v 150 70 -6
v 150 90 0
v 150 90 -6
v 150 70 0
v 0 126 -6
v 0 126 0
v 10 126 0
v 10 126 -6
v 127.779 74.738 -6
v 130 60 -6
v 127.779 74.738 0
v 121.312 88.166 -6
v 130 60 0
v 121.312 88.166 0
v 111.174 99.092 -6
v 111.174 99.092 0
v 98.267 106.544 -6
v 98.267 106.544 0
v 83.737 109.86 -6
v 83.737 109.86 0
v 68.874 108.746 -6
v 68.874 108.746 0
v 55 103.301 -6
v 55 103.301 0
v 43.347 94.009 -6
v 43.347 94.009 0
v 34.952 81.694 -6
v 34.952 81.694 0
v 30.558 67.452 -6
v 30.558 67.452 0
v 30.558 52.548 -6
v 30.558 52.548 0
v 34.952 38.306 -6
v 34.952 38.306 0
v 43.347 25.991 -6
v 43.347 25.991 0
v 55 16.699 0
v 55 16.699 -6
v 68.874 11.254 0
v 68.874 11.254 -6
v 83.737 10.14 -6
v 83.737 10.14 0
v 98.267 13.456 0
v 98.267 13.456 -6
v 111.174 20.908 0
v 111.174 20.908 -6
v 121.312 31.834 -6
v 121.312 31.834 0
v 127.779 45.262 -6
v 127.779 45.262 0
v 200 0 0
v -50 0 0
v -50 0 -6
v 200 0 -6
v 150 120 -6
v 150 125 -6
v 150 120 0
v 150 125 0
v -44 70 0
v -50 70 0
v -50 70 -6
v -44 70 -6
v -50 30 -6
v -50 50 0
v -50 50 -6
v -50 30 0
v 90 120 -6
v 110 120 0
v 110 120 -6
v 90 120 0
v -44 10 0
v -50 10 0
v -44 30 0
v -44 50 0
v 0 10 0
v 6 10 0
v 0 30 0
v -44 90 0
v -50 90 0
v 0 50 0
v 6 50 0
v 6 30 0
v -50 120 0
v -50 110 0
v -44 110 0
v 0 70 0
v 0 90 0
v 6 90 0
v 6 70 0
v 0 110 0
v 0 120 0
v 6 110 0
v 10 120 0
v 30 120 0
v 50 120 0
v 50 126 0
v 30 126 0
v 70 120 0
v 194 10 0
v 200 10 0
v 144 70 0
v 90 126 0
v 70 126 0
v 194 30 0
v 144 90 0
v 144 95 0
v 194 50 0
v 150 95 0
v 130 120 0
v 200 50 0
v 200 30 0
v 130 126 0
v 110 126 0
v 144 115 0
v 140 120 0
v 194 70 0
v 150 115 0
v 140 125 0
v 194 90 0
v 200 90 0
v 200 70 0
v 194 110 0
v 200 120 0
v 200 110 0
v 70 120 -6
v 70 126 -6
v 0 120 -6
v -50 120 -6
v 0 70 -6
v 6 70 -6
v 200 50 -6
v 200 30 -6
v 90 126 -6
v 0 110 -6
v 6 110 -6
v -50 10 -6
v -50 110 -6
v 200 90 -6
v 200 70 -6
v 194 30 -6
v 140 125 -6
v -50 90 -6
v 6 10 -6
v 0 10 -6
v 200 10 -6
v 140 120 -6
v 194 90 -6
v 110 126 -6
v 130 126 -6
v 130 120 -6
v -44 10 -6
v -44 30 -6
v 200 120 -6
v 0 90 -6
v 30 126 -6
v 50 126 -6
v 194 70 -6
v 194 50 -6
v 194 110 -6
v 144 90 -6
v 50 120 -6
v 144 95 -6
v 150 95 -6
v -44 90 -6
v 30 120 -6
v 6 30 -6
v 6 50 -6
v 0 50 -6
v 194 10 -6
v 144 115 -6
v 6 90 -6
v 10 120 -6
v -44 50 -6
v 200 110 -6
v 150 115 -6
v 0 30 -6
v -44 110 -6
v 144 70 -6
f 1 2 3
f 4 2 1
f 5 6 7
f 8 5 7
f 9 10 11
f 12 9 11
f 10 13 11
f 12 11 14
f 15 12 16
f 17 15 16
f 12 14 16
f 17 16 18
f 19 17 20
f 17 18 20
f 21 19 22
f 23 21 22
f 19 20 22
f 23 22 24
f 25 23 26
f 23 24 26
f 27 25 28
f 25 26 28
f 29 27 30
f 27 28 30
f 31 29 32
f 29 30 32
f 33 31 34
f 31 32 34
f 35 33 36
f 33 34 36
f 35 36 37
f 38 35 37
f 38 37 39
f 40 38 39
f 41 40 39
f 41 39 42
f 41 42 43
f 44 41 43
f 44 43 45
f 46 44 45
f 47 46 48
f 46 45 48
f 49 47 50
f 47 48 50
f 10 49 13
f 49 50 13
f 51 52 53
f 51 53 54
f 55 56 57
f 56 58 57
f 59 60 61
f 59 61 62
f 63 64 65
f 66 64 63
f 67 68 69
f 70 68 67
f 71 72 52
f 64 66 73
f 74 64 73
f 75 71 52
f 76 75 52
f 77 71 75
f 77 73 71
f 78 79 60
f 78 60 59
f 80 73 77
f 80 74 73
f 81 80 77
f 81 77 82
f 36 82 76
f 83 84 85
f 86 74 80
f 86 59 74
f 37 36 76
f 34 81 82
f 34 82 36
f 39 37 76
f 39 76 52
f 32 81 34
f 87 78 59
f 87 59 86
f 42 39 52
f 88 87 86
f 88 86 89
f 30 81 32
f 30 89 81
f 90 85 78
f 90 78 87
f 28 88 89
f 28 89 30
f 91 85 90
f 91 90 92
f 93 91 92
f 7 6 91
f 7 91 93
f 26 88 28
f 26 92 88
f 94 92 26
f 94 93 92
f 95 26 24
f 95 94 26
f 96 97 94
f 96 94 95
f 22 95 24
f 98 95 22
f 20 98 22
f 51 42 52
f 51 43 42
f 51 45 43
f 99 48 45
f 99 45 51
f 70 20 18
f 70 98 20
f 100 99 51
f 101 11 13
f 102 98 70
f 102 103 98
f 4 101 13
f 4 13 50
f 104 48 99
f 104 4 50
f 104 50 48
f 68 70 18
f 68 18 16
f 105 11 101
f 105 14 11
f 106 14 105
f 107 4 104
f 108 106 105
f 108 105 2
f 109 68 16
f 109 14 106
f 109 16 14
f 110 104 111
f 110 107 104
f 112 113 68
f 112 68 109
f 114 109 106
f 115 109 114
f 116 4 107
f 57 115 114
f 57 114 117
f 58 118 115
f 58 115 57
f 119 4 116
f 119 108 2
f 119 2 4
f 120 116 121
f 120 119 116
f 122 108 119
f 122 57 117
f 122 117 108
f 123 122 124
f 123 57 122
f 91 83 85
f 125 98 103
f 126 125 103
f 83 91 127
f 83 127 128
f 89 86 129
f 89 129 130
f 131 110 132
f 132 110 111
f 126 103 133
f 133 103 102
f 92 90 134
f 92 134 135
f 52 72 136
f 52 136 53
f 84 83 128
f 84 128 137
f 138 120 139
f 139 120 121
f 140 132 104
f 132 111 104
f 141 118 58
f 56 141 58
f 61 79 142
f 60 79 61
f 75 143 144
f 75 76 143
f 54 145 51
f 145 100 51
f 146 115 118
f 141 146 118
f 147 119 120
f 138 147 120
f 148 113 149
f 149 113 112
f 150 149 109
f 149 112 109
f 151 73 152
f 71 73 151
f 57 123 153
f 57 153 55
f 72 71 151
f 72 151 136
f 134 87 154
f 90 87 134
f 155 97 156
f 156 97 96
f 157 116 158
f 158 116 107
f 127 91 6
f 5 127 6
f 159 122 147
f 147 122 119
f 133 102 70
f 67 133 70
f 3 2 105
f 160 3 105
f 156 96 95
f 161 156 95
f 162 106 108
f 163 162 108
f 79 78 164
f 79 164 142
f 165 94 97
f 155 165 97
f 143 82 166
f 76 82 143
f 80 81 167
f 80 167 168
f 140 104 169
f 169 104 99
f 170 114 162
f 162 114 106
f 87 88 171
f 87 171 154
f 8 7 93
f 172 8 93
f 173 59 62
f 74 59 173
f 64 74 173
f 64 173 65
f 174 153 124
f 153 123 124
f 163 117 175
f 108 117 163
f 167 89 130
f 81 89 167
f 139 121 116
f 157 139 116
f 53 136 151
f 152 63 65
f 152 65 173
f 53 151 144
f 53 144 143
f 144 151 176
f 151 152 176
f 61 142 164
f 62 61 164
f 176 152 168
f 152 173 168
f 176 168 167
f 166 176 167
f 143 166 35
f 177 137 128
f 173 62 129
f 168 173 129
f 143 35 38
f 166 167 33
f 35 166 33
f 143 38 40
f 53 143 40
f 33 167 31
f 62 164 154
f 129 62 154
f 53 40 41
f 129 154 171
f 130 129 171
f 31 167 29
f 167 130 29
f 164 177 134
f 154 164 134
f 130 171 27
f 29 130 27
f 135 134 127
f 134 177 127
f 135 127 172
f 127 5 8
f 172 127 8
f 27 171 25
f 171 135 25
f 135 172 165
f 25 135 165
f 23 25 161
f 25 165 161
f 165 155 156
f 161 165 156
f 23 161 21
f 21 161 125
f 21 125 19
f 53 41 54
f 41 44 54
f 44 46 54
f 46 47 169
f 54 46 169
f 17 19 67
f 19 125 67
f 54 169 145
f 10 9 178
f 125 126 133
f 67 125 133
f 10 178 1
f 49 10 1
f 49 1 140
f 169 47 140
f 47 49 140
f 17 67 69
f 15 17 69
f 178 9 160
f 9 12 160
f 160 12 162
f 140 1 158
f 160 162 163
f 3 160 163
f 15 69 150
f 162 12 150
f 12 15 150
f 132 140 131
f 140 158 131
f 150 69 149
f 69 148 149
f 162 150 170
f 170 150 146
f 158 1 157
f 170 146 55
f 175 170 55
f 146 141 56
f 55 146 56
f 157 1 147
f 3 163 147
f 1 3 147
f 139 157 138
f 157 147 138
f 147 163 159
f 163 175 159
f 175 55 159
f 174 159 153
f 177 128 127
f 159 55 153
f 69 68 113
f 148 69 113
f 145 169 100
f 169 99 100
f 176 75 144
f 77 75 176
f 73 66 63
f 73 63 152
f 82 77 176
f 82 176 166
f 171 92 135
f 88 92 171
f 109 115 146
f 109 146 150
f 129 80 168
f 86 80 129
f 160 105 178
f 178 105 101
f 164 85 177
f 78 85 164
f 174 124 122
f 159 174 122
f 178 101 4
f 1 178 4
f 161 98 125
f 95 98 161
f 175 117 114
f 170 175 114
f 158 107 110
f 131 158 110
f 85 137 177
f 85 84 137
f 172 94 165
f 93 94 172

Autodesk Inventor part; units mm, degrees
ref_plane "YZ Plane" through (0, 0, 0) normal (1, 0, 0) x (0, 1, 0)
ref_plane "XZ Plane" through (0, 0, 0) normal (0, 1, 0) x (-1, 0, 0)
ref_plane "XY Plane" through (0, 0, 0) normal (0, 0, 1) x (1, 0, 0)
sketch "Sketch1" plane through (0, 0, 0) normal (0, 0, 1) x (1, 0, 0)
  line L0 (0, 0) -> (0, 120)
  circle A0 centre (80, 60) radius 50
  line L1 (0, 0) -> (150, 0)
  line L2 (150, 120) -> (0, 120)
  line L3 (0, 120) -> (0, 110)
  line L4 (0, 110) -> (6, 110)
  line L5 (6, 110) -> (6, 90)
  line L6 (6, 90) -> (0, 90)
  line L7 (0, 90) -> (0, 70)
  line L8 (0, 70) -> (6, 70)
  line L9 (6, 70) -> (6, 50)
  line L10 (6, 50) -> (0, 50)
  line L11 (0, 50) -> (0, 30)
  line L12 (0, 30) -> (6, 30)
  line L13 (6, 30) -> (6, 10)
  line L14 (6, 10) -> (0, 10)
  line L15 (0, 120) -> (-50, 120)
  line L16 (-50, 120) -> (-50, 110)
  line L17 (-50, 110) -> (-44, 110)
  line L18 (-44, 110) -> (-44, 90)
  line L19 (-44, 90) -> (-50, 90)
  line L20 (-50, 90) -> (-50, 70)
  line L21 (-50, 70) -> (-44, 70)
  line L22 (-44, 70) -> (-44, 50)
  line L23 (-44, 50) -> (-50, 50)
  line L24 (-50, 50) -> (-50, 30)
  line L25 (-50, 30) -> (-44, 30)
  line L26 (-44, 30) -> (-44, 10)
  line L27 (-44, 10) -> (-50, 10)
  line L28 (-50, 10) -> (-50, 0)
  line L29 (-50, 0) -> (0, 0)
  line L30 (150, 115) -> (144, 115)
  line L31 (144, 115) -> (144, 95)
  line L32 (150, 120) -> (200, 120)
  line L33 (200, 120) -> (200, 110)
  line L34 (200, 110) -> (194, 110)
  line L35 (194, 110) -> (194, 90)
  line L36 (194, 90) -> (200, 90)
  line L37 (200, 90) -> (200, 70)
  line L38 (200, 70) -> (194, 70)
  line L39 (194, 70) -> (194, 50)
  line L40 (194, 50) -> (200, 50)
  line L41 (200, 50) -> (200, 30)
  line L42 (200, 30) -> (194, 30)
  line L43 (194, 30) -> (194, 10)
  line L44 (194, 10) -> (200, 10)
  line L45 (200, 10) -> (200, 0)
  line L46 (200, 0) -> (150, 0)
  line L47 (150, 120) -> (150, 0)
  line L48 (144, 95) -> (150, 95)
  line L49 (150, 95) -> (150, 90)
  line L50 (150, 90) -> (144, 90)
  line L51 (144, 90) -> (144, 70)
  line L52 (144, 70) -> (150, 70)
  line L53 (0, 120) -> (0, 126)
  line L54 (150, 125) -> (150, 120)
  line L55 (0, 126) -> (10, 126)
  line L56 (10, 126) -> (10, 120)
  line L57 (10, 120) -> (30, 120)
  line L58 (30, 120) -> (30, 126)
  line L59 (30, 126) -> (50, 126)
  line L60 (50, 126) -> (50, 120)
  line L61 (50, 120) -> (70, 120)
  line L62 (70, 120) -> (70, 126)
  line L63 (70, 126) -> (90, 126)
  line L64 (90, 126) -> (90, 120)
  line L65 (90, 120) -> (110, 120)
  line L66 (110, 120) -> (110, 126)
  line L67 (110, 126) -> (130, 126)
  line L68 (130, 126) -> (130, 120)
  line L69 (130, 120) -> (140, 120)
  line L70 (140, 120) -> (140, 125)
  line L71 (140, 125) -> (150, 125)
  dimension "d12" = 100
  dimension "d13" = 120
  dimension "d14" = 150
  dimension "d17" = 80
  dimension "d18" = 60
  dimension "d19" = 10
  dimension "d20" = 6
  dimension "d21" = 20
  dimension "d22" = 20
  dimension "d24" = 20
  dimension "d25" = 20
  dimension "d26" = 20
  dimension "d38" = 50
  dimension "d39" = 10
  dimension "d40" = 6
  dimension "d41" = 5
  dimension "d42" = 6
  dimension "d43" = 50
  dimension "d44" = 6
  dimension "d45" = 5
  dimension "d46" = 20
  dimension "d47" = 20
  dimension "d48" = 6
  dimension "d51" = 10
  dimension "d52" = 20
  dimension "d53" = 20
  dimension "d54" = 20
  dimension "d55" = 20
  dimension "d56" = 20
  dimension "d57" = 20
  dimension "d58" = 10
extrude "Extrusion1" add sketch "Sketch1" against normal blind 6 contours L29 L28 L27 L26 L25 L24 L23 L22 L21 L20 L19 L18 L17 L16 L15 L0 | L0 L14 L13 L12 L10 L9 L8 L6 L5 L4 L2 L47 L30 L31 L48 L50 L51 L52 L1 | L47 L32 L33 L34 L35 L36 L37 L38 L39 L40 L41 L42 L43 L44 L45 L46
extrude "Extrusion3" add sketch "Sketch1" against normal blind 6 contours L2 L70 L71 L54 | L53 L55 L56 L2 | L2 L66 L67 L68 | L58 L59 L60 L2 | L2 L62 L63 L64
sketch "Sketch3" plane through (0, 0, 0) normal (0, 0, 1) x (1, 0, 0)
  line L0 (200, 30) -> (200, 50) projected
  line L1 (194, 30) -> (200, 30) projected
  line L2 (200, 50) -> (200, 30) projected
  line L3 (200, 30) -> (194, 30) projected
  line L4 (194, 10) -> (194, 30) projected
  line L5 (194, 30) -> (194, 10) projected
  line L6 (200, 10) -> (194, 10) projected
  line L7 (194, 10) -> (200, 10) projected
  line L8 (200, 0) -> (200, 10) projected
  circle A0 centre (80, 60) radius 50 projected
  circle A1 centre (80, 60) radius 50 projected
  circle A2 centre (80, 60) radius 50 projected
  circle A3 centre (80, 60) radius 50 projected
  line L9 (0, 30) -> (6, 30) projected
  line L10 (6, 30) -> (6, 10) projected
  line L11 (6, 10) -> (0, 10) projected
  line L12 (0, 10) -> (0, 30) projected
  circle A4 centre (80, 60) radius 50 projected
  line L13 (150, 90) -> (150, 70) projected
  line L14 (150, 70) -> (144, 70) projected
  line L15 (144, 70) -> (144, 90) projected
  line L16 (144, 90) -> (150, 90) projected
  line L17 (150, 115) -> (150, 95) projected
  line L18 (150, 95) -> (144, 95) projected
  line L19 (144, 95) -> (144, 115) projected
  line L20 (144, 115) -> (150, 115) projected
  line L21 (0, 70) -> (6, 70) projected
  line L22 (6, 70) -> (6, 50) projected
  line L23 (6, 50) -> (0, 50) projected
  line L24 (0, 50) -> (0, 70) projected
  line L25 (0, 110) -> (6, 110) projected
  line L26 (6, 110) -> (6, 90) projected
  line L27 (6, 90) -> (0, 90) projected
  line L28 (0, 90) -> (0, 110) projected
  line L29 (200, 120) -> (150, 120) projected
  line L30 (150, 120) -> (150, 125) projected
  line L31 (150, 125) -> (140, 125) projected
  line L32 (140, 125) -> (140, 120) projected
  line L33 (140, 120) -> (130, 120) projected
  line L34 (130, 120) -> (130, 126) projected
  line L35 (130, 126) -> (110, 126) projected
  line L36 (110, 126) -> (110, 120) projected
  line L37 (110, 120) -> (90, 120) projected
  line L38 (90, 120) -> (90, 126) projected
  line L39 (90, 126) -> (70, 126) projected
  line L40 (70, 126) -> (70, 120) projected
  line L41 (70, 120) -> (50, 120) projected
  line L42 (50, 120) -> (50, 126) projected
  line L43 (50, 126) -> (30, 126) projected
  line L44 (30, 126) -> (30, 120) projected
  line L45 (30, 120) -> (10, 120) projected
  line L46 (10, 120) -> (10, 126) projected
  line L47 (10, 126) -> (0, 126) projected
  line L48 (0, 126) -> (0, 120) projected
  line L49 (0, 120) -> (-50, 120) projected
  line L50 (-50, 120) -> (-50, 110) projected
  line L51 (-50, 110) -> (-44, 110) projected
  line L52 (-44, 110) -> (-44, 90) projected
  line L53 (-44, 90) -> (-50, 90) projected
  line L54 (-50, 90) -> (-50, 70) projected
  line L55 (-50, 70) -> (-44, 70) projected
  line L56 (-44, 70) -> (-44, 50) projected
  line L57 (-44, 50) -> (-50, 50) projected
  line L58 (-50, 50) -> (-50, 30) projected
  line L59 (-50, 30) -> (-44, 30) projected
  line L60 (-44, 30) -> (-44, 10) projected
  line L61 (-44, 10) -> (-50, 10) projected
  line L62 (-50, 10) -> (-50, 0) projected
  line L63 (-50, 0) -> (200, 0) projected
  line L64 (200, 0) -> (200, 10) projected
  line L65 (200, 10) -> (194, 10) projected
  line L66 (194, 10) -> (194, 30) projected
  line L67 (194, 30) -> (200, 30) projected
  line L68 (200, 30) -> (200, 50) projected
  line L69 (200, 50) -> (194, 50) projected
  line L70 (194, 50) -> (194, 70) projected
  line L71 (194, 70) -> (200, 70) projected
  line L72 (200, 70) -> (200, 90) projected
  line L73 (200, 90) -> (194, 90) projected
  line L74 (194, 90) -> (194, 110) projected
  line L75 (194, 110) -> (200, 110) projected
  line L76 (200, 110) -> (200, 120) projected
  line L77 (6, 30) -> (0, 30) projected
  line L78 (0, 30) -> (0, 10) projected
  line L79 (0, 10) -> (6, 10) projected
  line L80 (6, 10) -> (6, 30) projected
  circle A5 centre (80, 60) radius 50 projected
  line L81 (150, 70) -> (150, 90) projected
  line L82 (150, 90) -> (144, 90) projected
  line L83 (144, 90) -> (144, 70) projected
  line L84 (144, 70) -> (150, 70) projected
  line L85 (150, 95) -> (150, 115) projected
  line L86 (150, 115) -> (144, 115) projected
  line L87 (144, 115) -> (144, 95) projected
  line L88 (144, 95) -> (150, 95) projected
  line L89 (6, 70) -> (0, 70) projected
  line L90 (0, 70) -> (0, 50) projected
  line L91 (0, 50) -> (6, 50) projected
  line L92 (6, 50) -> (6, 70) projected
  line L93 (6, 110) -> (0, 110) projected
  line L94 (0, 110) -> (0, 90) projected
  line L95 (0, 90) -> (6, 90) projected
  line L96 (6, 90) -> (6, 110) projected
  line L97 (-50, 120) -> (0, 120) projected
  line L98 (0, 120) -> (0, 126) projected
  line L99 (0, 126) -> (10, 126) projected
  line L100 (10, 126) -> (10, 120) projected
  line L101 (10, 120) -> (30, 120) projected
  line L102 (30, 120) -> (30, 126) projected
  line L103 (30, 126) -> (50, 126) projected
  line L104 (50, 126) -> (50, 120) projected
  line L105 (50, 120) -> (70, 120) projected
  line L106 (70, 120) -> (70, 126) projected
  line L107 (70, 126) -> (90, 126) projected
  line L108 (90, 126) -> (90, 120) projected
  line L109 (90, 120) -> (110, 120) projected
  line L110 (110, 120) -> (110, 126) projected
  line L111 (110, 126) -> (130, 126) projected
  line L112 (130, 126) -> (130, 120) projected
  line L113 (130, 120) -> (140, 120) projected
  line L114 (140, 120) -> (140, 125) projected
  line L115 (140, 125) -> (150, 125) projected
  line L116 (150, 125) -> (150, 120) projected
  line L117 (150, 120) -> (200, 120) projected
  line L118 (200, 120) -> (200, 110) projected
  line L119 (200, 110) -> (194, 110) projected
  line L120 (194, 110) -> (194, 90) projected
  line L121 (194, 90) -> (200, 90) projected
  line L122 (200, 90) -> (200, 70) projected
  line L123 (200, 70) -> (194, 70) projected
  line L124 (194, 70) -> (194, 50) projected
  line L125 (194, 50) -> (200, 50) projected
  line L126 (200, 50) -> (200, 30) projected
  line L127 (200, 30) -> (194, 30) projected
  line L128 (194, 30) -> (194, 10) projected
  line L129 (194, 10) -> (200, 10) projected
  line L130 (200, 10) -> (200, 0) projected
  line L131 (200, 0) -> (-50, 0) projected
  line L132 (-50, 0) -> (-50, 10) projected
  line L133 (-50, 10) -> (-44, 10) projected
  line L134 (-44, 10) -> (-44, 30) projected
  line L135 (-44, 30) -> (-50, 30) projected
  line L136 (-50, 30) -> (-50, 50) projected
  line L137 (-50, 50) -> (-44, 50) projected
  line L138 (-44, 50) -> (-44, 70) projected
  line L139 (-44, 70) -> (-50, 70) projected
  line L140 (-50, 70) -> (-50, 90) projected
  line L141 (-50, 90) -> (-44, 90) projected
  line L142 (-44, 90) -> (-44, 110) projected
  line L143 (-44, 110) -> (-50, 110) projected
  line L144 (-50, 110) -> (-50, 120) projected
  line L145 (-50, 0) -> (200, 0) projected
  line L146 (200, 0) -> (-50, 0) projected
  line L147 (-50, 0) -> (200, 0) projected
  line L148 (200, 0) -> (-50, 0) projected
  line L149 (200, 10) -> (200, 0) projected
  line L150 (200, 90) -> (194, 90) projected
  line L151 (194, 90) -> (200, 90) projected
  line L152 (194, 50) -> (200, 50) projected
  line L153 (200, 110) -> (194, 110) projected
  line L154 (194, 110) -> (200, 110) projected
  line L155 (200, 120) -> (200, 110) projected
  line L156 (200, 110) -> (200, 120) projected
  line L157 (200, 50) -> (194, 50) projected
  line L158 (194, 110) -> (194, 90) projected
  line L159 (194, 70) -> (194, 50) projected
  line L160 (194, 90) -> (194, 110) projected
  line L161 (194, 50) -> (194, 70) projected
  line L162 (200, 90) -> (200, 70) projected
  line L163 (200, 70) -> (200, 90) projected
  line L164 (194, 70) -> (200, 70) projected
  line L165 (6, 50) -> (0, 50) projected
  line L166 (6, 50) -> (6, 70) projected
  line L167 (6, 70) -> (6, 50) projected
  line L168 (0, 70) -> (0, 50) projected
  line L169 (-44, 70) -> (-44, 50) projected
  line L170 (0, 50) -> (0, 70) projected
  line L171 (200, 70) -> (194, 70) projected
  line L172 (70, 120) -> (70, 126) projected
  line L173 (70, 126) -> (70, 120) projected
  line L174 (70, 126) -> (90, 126) projected
  line L175 (90, 126) -> (70, 126) projected
  line L176 (90, 126) -> (90, 120) projected
  line L177 (90, 120) -> (90, 126) projected
  line L178 (110, 126) -> (110, 120) projected
  line L179 (110, 120) -> (110, 126) projected
  line L180 (110, 120) -> (90, 120) projected
  line L181 (90, 120) -> (110, 120) projected
  line L182 (90, 120) -> (90, 126) projected
  line L183 (90, 126) -> (90, 120) projected
  line L184 (90, 126) -> (70, 126) projected
  line L185 (70, 126) -> (90, 126) projected
  line L186 (90, 120) -> (110, 120) projected
  line L187 (110, 120) -> (90, 120) projected
  line L188 (130, 120) -> (140, 120) projected
  line L189 (140, 120) -> (130, 120) projected
  line L190 (110, 120) -> (110, 126) projected
  line L191 (110, 126) -> (110, 120) projected
  line L192 (110, 126) -> (130, 126) projected
  line L193 (130, 126) -> (110, 126) projected
  line L194 (130, 126) -> (130, 120) projected
  line L195 (130, 120) -> (130, 126) projected
  line L196 (140, 125) -> (150, 125) projected
  line L197 (150, 125) -> (140, 125) projected
  line L198 (150, 125) -> (150, 120) projected
  line L199 (150, 120) -> (150, 125) projected
  line L200 (150, 120) -> (150, 125) projected
  line L201 (150, 125) -> (150, 120) projected
  line L202 (150, 125) -> (140, 125) projected
  line L203 (140, 125) -> (150, 125) projected
  line L204 (140, 120) -> (140, 125) projected
  line L205 (140, 125) -> (140, 120) projected
  line L206 (140, 125) -> (140, 120) projected
  line L207 (140, 120) -> (140, 125) projected
  line L208 (130, 120) -> (140, 120) projected
  line L209 (140, 120) -> (130, 120) projected
  line L210 (130, 120) -> (130, 126) projected
  line L211 (130, 126) -> (130, 120) projected
  line L212 (130, 126) -> (110, 126) projected
  line L213 (110, 126) -> (130, 126) projected
  line L214 (150, 70) -> (150, 90) projected
  line L215 (150, 90) -> (150, 70) projected
  line L216 (150, 90) -> (144, 90) projected
  line L217 (144, 90) -> (150, 90) projected
  line L218 (144, 90) -> (144, 70) projected
  line L219 (144, 70) -> (144, 90) projected
  line L220 (144, 70) -> (150, 70) projected
  line L221 (150, 70) -> (144, 70) projected
  line L222 (144, 70) -> (144, 90) projected
  line L223 (144, 90) -> (144, 70) projected
  line L224 (144, 90) -> (150, 90) projected
  line L225 (150, 90) -> (144, 90) projected
  line L226 (150, 95) -> (144, 95) projected
  line L227 (144, 95) -> (150, 95) projected
  line L228 (150, 115) -> (150, 95) projected
  line L229 (150, 95) -> (150, 115) projected
  line L230 (144, 95) -> (144, 115) projected
  line L231 (144, 115) -> (144, 95) projected
  line L232 (144, 115) -> (150, 115) projected
  line L233 (150, 115) -> (144, 115) projected
  line L234 (150, 70) -> (144, 70) projected
  line L235 (144, 70) -> (150, 70) projected
  line L236 (150, 90) -> (150, 70) projected
  line L237 (150, 70) -> (150, 90) projected
  line L238 (150, 120) -> (200, 120) projected
  line L239 (200, 120) -> (150, 120) projected
  line L240 (200, 120) -> (150, 120) projected
  line L241 (150, 120) -> (200, 120) projected
  line L242 (194, 90) -> (194, 110) projected
  line L243 (194, 110) -> (194, 90) projected
  line L244 (194, 110) -> (200, 110) projected
  line L245 (200, 110) -> (194, 110) projected
  line L246 (200, 90) -> (194, 90) projected
  line L247 (194, 90) -> (200, 90) projected
  line L248 (200, 70) -> (200, 90) projected
  line L249 (200, 90) -> (200, 70) projected
  line L250 (200, 50) -> (194, 50) projected
  line L251 (194, 50) -> (200, 50) projected
  line L252 (200, 30) -> (200, 50) projected
  line L253 (200, 50) -> (200, 30) projected
  line L254 (194, 30) -> (200, 30) projected
  line L255 (200, 30) -> (194, 30) projected
  line L256 (194, 10) -> (194, 30) projected
  line L257 (194, 30) -> (194, 10) projected
  line L258 (200, 0) -> (200, 10) projected
  line L259 (200, 10) -> (200, 0) projected
  line L260 (200, 10) -> (194, 10) projected
  line L261 (194, 10) -> (200, 10) projected
  line L262 (194, 50) -> (194, 70) projected
  line L263 (194, 70) -> (194, 50) projected
  line L264 (194, 70) -> (200, 70) projected
  line L265 (200, 70) -> (194, 70) projected
  line L266 (200, 110) -> (200, 120) projected
  line L267 (200, 120) -> (200, 110) projected
  line L268 (150, 95) -> (150, 115) projected
  line L269 (150, 115) -> (150, 95) projected
  line L270 (150, 115) -> (144, 115) projected
  line L271 (144, 115) -> (150, 115) projected
  line L272 (144, 115) -> (144, 95) projected
  line L273 (144, 95) -> (144, 115) projected
  line L274 (144, 95) -> (150, 95) projected
  line L275 (150, 95) -> (144, 95) projected
  line L276 (30, 120) -> (10, 120) projected
  line L277 (10, 120) -> (30, 120) projected
  line L278 (30, 126) -> (30, 120) projected
  line L279 (30, 120) -> (30, 126) projected
  line L280 (50, 126) -> (30, 126) projected
  line L281 (30, 126) -> (50, 126) projected
  line L282 (50, 120) -> (70, 120) projected
  line L283 (70, 120) -> (50, 120) projected
  line L284 (70, 126) -> (70, 120) projected
  line L285 (70, 120) -> (70, 126) projected
  line L286 (50, 120) -> (50, 126) projected
  line L287 (50, 126) -> (50, 120) projected
  line L288 (50, 120) -> (70, 120) projected
  line L289 (70, 120) -> (50, 120) projected
  line L290 (6, 90) -> (6, 110) projected
  line L291 (6, 10) -> (6, 30) projected
  line L292 (50, 126) -> (50, 120) projected
  line L293 (30, 126) -> (30, 120) projected
  line L294 (30, 126) -> (50, 126) projected
  line L295 (50, 126) -> (30, 126) projected
  line L296 (50, 120) -> (50, 126) projected
  line L297 (0, 10) -> (0, 30) projected
  line L298 (0, 110) -> (0, 90) projected
  line L299 (0, 90) -> (0, 110) projected
  line L300 (6, 90) -> (0, 90) projected
  line L301 (6, 110) -> (6, 90) projected
  line L302 (0, 90) -> (6, 90) projected
  line L303 (0, 50) -> (6, 50) projected
  line L304 (0, 110) -> (6, 110) projected
  line L305 (6, 110) -> (0, 110) projected
  line L306 (10, 120) -> (10, 126) projected
  line L307 (0, 126) -> (0, 120) projected
  line L308 (10, 126) -> (0, 126) projected
  line L309 (0, 120) -> (0, 126) projected
  line L310 (0, 126) -> (10, 126) projected
  line L311 (10, 126) -> (10, 120) projected
  line L312 (10, 120) -> (30, 120) projected
  line L313 (30, 120) -> (10, 120) projected
  line L314 (0, 120) -> (-50, 120) projected
  line L315 (-50, 120) -> (0, 120) projected
  line L316 (30, 120) -> (30, 126) projected
  line L317 (-44, 50) -> (-44, 70) projected
  line L318 (-44, 70) -> (-50, 70) projected
  line L319 (-50, 70) -> (-44, 70) projected
  line L320 (-50, 70) -> (-50, 90) projected
  line L321 (-50, 90) -> (-50, 70) projected
  line L322 (-50, 90) -> (-44, 90) projected
  line L323 (-44, 90) -> (-50, 90) projected
  line L324 (-44, 90) -> (-44, 110) projected
  line L325 (6, 70) -> (0, 70) projected
  line L326 (0, 70) -> (6, 70) projected
  line L327 (-44, 110) -> (-44, 90) projected
  line L328 (-50, 110) -> (-44, 110) projected
  line L329 (-44, 110) -> (-50, 110) projected
  line L330 (-50, 120) -> (-50, 110) projected
  line L331 (-50, 110) -> (-50, 120) projected
  line L332 (-50, 10) -> (-50, 0) projected
  line L333 (-50, 0) -> (-50, 10) projected
  line L334 (-44, 10) -> (-50, 10) projected
  line L335 (-50, 10) -> (-44, 10) projected
  line L336 (10, 120) -> (10, 126) projected
  line L337 (10, 126) -> (10, 120) projected
  line L338 (10, 126) -> (0, 126) projected
  line L339 (0, 126) -> (10, 126) projected
  line L340 (0, 126) -> (0, 120) projected
  line L341 (0, 120) -> (0, 126) projected
  line L342 (0, 110) -> (6, 110) projected
  line L343 (6, 110) -> (0, 110) projected
  line L344 (6, 110) -> (6, 90) projected
  line L345 (6, 90) -> (6, 110) projected
  line L346 (0, 90) -> (0, 110) projected
  line L347 (0, 110) -> (0, 90) projected
  line L348 (6, 90) -> (0, 90) projected
  line L349 (0, 90) -> (6, 90) projected
  line L350 (0, 70) -> (6, 70) projected
  line L351 (6, 70) -> (0, 70) projected
  line L352 (6, 70) -> (6, 50) projected
  line L353 (6, 50) -> (6, 70) projected
  line L354 (0, 50) -> (0, 70) projected
  line L355 (0, 70) -> (0, 50) projected
  line L356 (6, 50) -> (0, 50) projected
  line L357 (0, 50) -> (6, 50) projected
  line L358 (-50, 120) -> (0, 120) projected
  line L359 (0, 120) -> (-50, 120) projected
  line L360 (-50, 120) -> (-50, 110) projected
  line L361 (-50, 110) -> (-50, 120) projected
  line L362 (-44, 110) -> (-44, 90) projected
  line L363 (-44, 90) -> (-44, 110) projected
  line L364 (-50, 110) -> (-44, 110) projected
  line L365 (-44, 110) -> (-50, 110) projected
  line L366 (0, 30) -> (6, 30) projected
  line L367 (6, 30) -> (0, 30) projected
  line L368 (-44, 90) -> (-50, 90) projected
  line L369 (-50, 90) -> (-44, 90) projected
  line L370 (-50, 90) -> (-50, 70) projected
  line L371 (-50, 70) -> (-50, 90) projected
  line L372 (6, 30) -> (6, 10) projected
  line L373 (6, 10) -> (6, 30) projected
  line L374 (6, 10) -> (0, 10) projected
  line L375 (0, 10) -> (6, 10) projected
  line L376 (0, 10) -> (0, 30) projected
  line L377 (0, 30) -> (0, 10) projected
  line L378 (-50, 70) -> (-44, 70) projected
  line L379 (-44, 70) -> (-50, 70) projected
  line L380 (-44, 70) -> (-44, 50) projected
  line L381 (-44, 50) -> (-44, 70) projected
  line L382 (-44, 50) -> (-50, 50) projected
  line L383 (-50, 50) -> (-44, 50) projected
  line L384 (-50, 50) -> (-50, 30) projected
  line L385 (-50, 30) -> (-50, 50) projected
  line L386 (-44, 30) -> (-44, 10) projected
  line L387 (-44, 10) -> (-44, 30) projected
  line L388 (-50, 30) -> (-44, 30) projected
  line L389 (-44, 30) -> (-50, 30) projected
  line L390 (-50, 50) -> (-50, 30) projected
  line L391 (-44, 10) -> (-44, 30) projected
  line L392 (-44, 50) -> (-50, 50) projected
  line L393 (-50, 50) -> (-44, 50) projected
  line L394 (-50, 30) -> (-50, 50) projected
  line L395 (-44, 30) -> (-50, 30) projected
  line L396 (-50, 30) -> (-44, 30) projected
  line L397 (-44, 30) -> (-44, 10) projected
  line L398 (-50, 10) -> (-44, 10) projected
  line L399 (-50, 0) -> (-50, 10) projected
  line L400 (0, 30) -> (0, 10) projected
  line L401 (-44, 10) -> (-50, 10) projected
  line L402 (6, 30) -> (0, 30) projected
  line L403 (0, 10) -> (6, 10) projected
  line L404 (0, 30) -> (6, 30) projected
  line L405 (6, 30) -> (6, 10) projected
  line L406 (6, 10) -> (0, 10) projected
  line L407 (-50, 10) -> (-50, 0) projected
  point P0 (0, 0)
properties part number "Archimedes Screw Border1"
